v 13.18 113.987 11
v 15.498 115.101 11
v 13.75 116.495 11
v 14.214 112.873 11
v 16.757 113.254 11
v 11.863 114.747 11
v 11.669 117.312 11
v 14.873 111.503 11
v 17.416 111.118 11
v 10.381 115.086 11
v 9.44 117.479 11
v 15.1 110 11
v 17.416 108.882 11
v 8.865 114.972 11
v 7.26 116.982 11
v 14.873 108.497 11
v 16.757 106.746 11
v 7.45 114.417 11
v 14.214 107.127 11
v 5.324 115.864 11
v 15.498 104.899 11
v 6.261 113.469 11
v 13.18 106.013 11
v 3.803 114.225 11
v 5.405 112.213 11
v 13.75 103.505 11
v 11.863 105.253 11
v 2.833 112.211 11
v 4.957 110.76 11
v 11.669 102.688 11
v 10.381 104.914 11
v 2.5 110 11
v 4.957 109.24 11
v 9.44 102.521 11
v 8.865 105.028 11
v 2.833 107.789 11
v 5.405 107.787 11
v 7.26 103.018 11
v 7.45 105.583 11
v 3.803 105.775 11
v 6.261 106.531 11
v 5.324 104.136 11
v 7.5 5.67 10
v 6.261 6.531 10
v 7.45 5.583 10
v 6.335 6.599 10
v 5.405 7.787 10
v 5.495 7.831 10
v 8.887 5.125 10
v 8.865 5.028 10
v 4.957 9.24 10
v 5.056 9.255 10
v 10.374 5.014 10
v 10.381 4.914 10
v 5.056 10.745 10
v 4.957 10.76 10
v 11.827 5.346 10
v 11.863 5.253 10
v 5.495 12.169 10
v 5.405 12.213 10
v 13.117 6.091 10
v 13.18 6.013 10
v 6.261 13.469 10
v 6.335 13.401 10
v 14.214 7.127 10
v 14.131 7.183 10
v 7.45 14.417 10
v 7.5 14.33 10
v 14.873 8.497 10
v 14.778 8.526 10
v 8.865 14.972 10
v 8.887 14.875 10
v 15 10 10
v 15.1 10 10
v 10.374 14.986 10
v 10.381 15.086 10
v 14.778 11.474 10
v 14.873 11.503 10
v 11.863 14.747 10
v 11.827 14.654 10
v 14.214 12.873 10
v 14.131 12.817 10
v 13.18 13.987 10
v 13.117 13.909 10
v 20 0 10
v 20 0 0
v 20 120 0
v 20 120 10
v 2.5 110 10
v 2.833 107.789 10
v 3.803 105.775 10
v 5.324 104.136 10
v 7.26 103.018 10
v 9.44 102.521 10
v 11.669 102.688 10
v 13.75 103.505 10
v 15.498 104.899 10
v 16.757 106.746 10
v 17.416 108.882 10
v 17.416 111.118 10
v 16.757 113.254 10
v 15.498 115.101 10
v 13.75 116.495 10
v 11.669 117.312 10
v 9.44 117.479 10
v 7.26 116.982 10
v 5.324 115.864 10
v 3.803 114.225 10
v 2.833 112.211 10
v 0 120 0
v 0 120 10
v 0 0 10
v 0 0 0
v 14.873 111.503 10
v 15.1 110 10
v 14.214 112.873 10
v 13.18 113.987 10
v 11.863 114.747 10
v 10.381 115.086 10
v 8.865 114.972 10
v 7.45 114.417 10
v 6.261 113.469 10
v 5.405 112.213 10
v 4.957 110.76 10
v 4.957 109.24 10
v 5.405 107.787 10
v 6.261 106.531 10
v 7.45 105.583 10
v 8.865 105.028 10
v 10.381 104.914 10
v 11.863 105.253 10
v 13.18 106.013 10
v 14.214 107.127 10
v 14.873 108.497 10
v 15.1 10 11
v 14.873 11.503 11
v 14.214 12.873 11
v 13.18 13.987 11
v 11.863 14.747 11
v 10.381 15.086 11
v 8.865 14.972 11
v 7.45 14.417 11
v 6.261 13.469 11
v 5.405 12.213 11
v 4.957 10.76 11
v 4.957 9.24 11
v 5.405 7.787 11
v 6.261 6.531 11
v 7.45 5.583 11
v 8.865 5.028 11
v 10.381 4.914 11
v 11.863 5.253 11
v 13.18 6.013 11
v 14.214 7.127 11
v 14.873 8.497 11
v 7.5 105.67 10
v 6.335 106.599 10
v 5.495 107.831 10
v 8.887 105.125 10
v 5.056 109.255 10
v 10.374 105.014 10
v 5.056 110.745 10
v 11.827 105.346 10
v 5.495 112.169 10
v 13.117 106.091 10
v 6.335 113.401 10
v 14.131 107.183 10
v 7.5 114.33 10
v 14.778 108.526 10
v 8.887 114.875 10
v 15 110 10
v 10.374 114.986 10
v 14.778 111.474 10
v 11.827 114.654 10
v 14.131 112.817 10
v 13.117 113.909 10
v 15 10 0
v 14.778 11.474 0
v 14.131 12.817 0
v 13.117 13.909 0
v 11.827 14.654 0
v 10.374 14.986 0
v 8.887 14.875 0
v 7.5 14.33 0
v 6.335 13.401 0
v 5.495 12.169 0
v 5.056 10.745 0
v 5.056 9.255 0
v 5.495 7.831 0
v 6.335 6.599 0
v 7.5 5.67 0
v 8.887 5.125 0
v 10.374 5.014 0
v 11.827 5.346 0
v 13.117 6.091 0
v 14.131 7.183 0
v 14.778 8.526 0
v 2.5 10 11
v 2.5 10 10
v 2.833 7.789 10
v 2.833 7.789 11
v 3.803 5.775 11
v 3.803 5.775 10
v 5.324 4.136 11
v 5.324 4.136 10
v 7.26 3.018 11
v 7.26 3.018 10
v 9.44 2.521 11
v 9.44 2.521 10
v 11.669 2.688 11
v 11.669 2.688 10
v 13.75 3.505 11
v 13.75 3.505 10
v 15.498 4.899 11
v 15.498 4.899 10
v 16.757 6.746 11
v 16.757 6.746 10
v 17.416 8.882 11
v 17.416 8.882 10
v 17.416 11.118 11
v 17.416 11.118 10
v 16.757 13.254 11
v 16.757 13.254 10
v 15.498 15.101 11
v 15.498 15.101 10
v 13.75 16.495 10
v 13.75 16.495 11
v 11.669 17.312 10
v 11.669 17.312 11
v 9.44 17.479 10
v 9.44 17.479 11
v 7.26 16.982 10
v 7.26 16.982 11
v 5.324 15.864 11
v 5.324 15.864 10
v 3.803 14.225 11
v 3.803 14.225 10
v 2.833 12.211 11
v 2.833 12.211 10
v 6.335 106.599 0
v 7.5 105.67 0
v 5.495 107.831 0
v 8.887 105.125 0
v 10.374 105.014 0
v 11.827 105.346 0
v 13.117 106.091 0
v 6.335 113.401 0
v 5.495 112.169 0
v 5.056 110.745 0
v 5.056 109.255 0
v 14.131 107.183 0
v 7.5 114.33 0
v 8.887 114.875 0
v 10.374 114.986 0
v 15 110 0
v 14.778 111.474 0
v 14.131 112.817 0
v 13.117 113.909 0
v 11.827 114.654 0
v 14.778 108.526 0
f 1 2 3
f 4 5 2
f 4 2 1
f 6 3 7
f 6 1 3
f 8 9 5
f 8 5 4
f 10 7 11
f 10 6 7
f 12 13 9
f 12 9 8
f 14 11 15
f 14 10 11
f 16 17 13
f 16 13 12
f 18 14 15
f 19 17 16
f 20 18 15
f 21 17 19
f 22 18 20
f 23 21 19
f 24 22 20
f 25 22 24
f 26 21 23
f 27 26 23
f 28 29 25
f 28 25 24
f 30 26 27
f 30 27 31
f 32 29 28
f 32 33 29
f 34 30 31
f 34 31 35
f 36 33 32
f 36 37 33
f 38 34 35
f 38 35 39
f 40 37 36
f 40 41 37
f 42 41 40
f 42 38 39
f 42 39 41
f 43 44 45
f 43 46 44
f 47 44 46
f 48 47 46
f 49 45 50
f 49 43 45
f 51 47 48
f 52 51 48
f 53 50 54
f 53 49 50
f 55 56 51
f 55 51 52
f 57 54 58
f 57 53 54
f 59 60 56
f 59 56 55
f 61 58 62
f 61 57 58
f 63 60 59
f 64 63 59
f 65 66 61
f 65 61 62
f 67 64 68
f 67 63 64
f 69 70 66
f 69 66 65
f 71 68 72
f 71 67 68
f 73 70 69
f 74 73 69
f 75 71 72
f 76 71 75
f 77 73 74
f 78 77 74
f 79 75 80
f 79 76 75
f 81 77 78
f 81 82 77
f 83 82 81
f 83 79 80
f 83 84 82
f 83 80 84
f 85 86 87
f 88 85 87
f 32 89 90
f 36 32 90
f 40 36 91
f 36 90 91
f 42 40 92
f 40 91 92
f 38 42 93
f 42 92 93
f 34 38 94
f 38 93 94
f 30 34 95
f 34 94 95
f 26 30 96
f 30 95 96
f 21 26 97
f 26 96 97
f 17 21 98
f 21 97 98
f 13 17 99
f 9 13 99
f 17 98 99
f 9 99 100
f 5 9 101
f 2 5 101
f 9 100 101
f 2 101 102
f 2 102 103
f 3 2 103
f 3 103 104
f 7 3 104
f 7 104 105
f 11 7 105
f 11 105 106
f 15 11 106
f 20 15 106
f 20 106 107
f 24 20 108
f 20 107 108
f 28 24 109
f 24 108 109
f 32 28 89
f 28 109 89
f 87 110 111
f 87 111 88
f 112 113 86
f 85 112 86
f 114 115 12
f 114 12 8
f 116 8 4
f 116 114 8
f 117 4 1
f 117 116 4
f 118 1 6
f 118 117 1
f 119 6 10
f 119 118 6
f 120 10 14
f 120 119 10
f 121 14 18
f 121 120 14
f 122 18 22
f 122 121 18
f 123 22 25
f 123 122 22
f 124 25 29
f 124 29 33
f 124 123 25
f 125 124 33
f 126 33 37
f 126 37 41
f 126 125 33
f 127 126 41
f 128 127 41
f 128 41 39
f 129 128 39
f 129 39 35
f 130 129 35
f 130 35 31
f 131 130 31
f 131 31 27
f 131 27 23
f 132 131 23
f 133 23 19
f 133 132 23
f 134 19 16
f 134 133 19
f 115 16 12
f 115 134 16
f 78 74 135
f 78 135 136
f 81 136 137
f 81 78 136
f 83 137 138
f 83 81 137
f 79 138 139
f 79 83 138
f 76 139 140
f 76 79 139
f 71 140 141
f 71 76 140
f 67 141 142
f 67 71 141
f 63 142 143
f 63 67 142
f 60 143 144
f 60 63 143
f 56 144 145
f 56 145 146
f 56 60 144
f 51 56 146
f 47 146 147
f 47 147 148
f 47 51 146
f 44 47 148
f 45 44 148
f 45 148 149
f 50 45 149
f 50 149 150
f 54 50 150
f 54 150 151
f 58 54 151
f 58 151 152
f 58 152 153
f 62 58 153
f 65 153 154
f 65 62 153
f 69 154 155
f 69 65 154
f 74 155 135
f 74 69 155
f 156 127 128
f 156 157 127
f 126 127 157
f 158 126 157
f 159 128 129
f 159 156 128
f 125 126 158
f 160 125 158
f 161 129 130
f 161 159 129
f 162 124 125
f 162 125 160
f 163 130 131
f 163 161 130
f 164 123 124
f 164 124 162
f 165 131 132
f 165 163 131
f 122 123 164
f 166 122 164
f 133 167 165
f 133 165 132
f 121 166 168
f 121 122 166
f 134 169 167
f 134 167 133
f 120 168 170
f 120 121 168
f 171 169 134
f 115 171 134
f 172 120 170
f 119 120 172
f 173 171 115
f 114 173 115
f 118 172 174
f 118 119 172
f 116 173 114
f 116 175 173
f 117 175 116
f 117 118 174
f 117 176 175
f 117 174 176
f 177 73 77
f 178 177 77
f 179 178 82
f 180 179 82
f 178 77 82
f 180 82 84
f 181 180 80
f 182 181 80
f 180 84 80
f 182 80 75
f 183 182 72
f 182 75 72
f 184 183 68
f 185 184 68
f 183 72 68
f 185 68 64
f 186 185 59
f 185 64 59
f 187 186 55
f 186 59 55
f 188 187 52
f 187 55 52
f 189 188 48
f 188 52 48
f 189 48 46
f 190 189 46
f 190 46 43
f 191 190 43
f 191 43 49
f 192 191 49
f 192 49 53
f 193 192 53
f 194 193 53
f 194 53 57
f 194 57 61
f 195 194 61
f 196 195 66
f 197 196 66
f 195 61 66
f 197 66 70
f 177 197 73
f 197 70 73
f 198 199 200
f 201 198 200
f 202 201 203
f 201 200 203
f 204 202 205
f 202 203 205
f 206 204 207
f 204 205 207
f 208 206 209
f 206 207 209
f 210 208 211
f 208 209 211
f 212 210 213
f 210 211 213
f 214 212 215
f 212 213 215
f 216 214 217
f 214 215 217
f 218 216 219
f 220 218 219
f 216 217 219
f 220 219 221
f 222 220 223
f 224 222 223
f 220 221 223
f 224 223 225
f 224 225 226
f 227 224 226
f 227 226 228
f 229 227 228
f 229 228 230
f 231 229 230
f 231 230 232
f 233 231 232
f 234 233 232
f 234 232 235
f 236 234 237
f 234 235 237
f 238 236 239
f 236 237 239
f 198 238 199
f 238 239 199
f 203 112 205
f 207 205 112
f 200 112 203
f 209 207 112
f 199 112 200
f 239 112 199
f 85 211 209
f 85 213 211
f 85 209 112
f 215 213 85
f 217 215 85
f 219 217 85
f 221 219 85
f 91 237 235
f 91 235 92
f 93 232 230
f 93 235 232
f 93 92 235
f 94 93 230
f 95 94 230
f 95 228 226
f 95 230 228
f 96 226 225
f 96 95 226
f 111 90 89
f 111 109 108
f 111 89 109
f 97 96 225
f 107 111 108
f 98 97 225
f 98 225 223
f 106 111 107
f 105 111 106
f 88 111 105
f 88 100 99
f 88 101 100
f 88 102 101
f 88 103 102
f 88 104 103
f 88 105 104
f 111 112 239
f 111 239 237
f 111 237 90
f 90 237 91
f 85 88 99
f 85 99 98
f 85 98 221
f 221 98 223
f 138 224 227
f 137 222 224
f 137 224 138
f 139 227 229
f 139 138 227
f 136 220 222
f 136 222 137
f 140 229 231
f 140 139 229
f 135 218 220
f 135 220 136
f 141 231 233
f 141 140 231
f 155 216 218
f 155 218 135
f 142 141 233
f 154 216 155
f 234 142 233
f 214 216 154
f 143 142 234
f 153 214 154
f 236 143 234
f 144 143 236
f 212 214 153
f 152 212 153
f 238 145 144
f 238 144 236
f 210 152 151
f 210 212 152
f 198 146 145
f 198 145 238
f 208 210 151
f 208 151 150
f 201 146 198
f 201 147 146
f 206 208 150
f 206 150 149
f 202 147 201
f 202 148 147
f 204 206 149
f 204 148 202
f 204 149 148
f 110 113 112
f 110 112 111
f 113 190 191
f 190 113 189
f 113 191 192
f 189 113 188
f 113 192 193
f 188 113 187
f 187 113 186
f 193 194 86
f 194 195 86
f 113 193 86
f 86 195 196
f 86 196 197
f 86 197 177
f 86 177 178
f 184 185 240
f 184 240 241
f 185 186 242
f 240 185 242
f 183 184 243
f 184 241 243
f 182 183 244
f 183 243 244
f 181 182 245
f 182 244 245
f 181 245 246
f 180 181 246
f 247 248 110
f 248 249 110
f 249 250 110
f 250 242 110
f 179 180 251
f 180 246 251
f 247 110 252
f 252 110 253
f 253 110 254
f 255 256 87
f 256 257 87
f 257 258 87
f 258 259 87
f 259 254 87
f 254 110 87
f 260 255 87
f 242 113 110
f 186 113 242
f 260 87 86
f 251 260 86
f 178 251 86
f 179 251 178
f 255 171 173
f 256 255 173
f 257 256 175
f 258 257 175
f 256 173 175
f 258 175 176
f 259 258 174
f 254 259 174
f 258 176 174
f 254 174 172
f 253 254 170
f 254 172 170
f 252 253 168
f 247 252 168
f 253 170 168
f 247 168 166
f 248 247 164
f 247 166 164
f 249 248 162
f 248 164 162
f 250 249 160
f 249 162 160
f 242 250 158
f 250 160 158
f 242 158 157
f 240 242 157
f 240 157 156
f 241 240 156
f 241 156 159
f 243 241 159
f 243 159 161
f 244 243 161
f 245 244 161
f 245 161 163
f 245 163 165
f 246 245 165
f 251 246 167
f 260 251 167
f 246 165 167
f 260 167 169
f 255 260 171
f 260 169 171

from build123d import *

# Parameters (mm, degrees)
SKIZZE1_W                       = 20
SKIZZE1_H                       = 120
AUFSATZ_LINEAR_AUSTRAGEN1_DEPTH = 10
SKIZZE2_R                       = 7.5
SKIZZE2_R_2                     = 5.1
AUFSATZ_LINEAR_AUSTRAGEN3_DEPTH = 1
SKIZZE5_R                       = 5
SCHNITT_LINEAR_AUSTRAGEN1_DEPTH = 10


with BuildPart() as part:
    # Skizze1 → Aufsatz-Linear austragen1 (new body)
    with BuildSketch(Plane.XY):
        with Locations((10, 60)):
            Rectangle(SKIZZE1_W, SKIZZE1_H)
    extrude(amount=AUFSATZ_LINEAR_AUSTRAGEN1_DEPTH)

    # Skizze2 → Aufsatz-Linear austragen3 (add)
    # profile 1 of 2: a face of its own
    with BuildSketch(Plane.XY.offset(10)):
        with Locations(Location((10, 110, 0), (0, 0, 180))):
            Circle(SKIZZE2_R)
        with Locations((10, 110)):
            Circle(SKIZZE2_R_2, mode=Mode.SUBTRACT)
    # profile 2 of 2: a face of its own
    with BuildSketch(Plane.XY.offset(10)):
        with Locations(Location((10, 10, 0), (0, 0, 180))):
            Circle(SKIZZE2_R)
        with Locations((10, 10)):
            Circle(SKIZZE2_R_2, mode=Mode.SUBTRACT)
    extrude(amount=AUFSATZ_LINEAR_AUSTRAGEN3_DEPTH)

    # Skizze5 → Schnitt-Linear austragen1 (cut)
    with BuildSketch(Plane.XY.offset(10)):
        with Locations((10, 110)):
            Circle(SKIZZE5_R)
        with Locations((10, 10)):
            Circle(SKIZZE5_R)
    extrude(amount=-SCHNITT_LINEAR_AUSTRAGEN1_DEPTH, mode=Mode.SUBTRACT)


solid = part.part
